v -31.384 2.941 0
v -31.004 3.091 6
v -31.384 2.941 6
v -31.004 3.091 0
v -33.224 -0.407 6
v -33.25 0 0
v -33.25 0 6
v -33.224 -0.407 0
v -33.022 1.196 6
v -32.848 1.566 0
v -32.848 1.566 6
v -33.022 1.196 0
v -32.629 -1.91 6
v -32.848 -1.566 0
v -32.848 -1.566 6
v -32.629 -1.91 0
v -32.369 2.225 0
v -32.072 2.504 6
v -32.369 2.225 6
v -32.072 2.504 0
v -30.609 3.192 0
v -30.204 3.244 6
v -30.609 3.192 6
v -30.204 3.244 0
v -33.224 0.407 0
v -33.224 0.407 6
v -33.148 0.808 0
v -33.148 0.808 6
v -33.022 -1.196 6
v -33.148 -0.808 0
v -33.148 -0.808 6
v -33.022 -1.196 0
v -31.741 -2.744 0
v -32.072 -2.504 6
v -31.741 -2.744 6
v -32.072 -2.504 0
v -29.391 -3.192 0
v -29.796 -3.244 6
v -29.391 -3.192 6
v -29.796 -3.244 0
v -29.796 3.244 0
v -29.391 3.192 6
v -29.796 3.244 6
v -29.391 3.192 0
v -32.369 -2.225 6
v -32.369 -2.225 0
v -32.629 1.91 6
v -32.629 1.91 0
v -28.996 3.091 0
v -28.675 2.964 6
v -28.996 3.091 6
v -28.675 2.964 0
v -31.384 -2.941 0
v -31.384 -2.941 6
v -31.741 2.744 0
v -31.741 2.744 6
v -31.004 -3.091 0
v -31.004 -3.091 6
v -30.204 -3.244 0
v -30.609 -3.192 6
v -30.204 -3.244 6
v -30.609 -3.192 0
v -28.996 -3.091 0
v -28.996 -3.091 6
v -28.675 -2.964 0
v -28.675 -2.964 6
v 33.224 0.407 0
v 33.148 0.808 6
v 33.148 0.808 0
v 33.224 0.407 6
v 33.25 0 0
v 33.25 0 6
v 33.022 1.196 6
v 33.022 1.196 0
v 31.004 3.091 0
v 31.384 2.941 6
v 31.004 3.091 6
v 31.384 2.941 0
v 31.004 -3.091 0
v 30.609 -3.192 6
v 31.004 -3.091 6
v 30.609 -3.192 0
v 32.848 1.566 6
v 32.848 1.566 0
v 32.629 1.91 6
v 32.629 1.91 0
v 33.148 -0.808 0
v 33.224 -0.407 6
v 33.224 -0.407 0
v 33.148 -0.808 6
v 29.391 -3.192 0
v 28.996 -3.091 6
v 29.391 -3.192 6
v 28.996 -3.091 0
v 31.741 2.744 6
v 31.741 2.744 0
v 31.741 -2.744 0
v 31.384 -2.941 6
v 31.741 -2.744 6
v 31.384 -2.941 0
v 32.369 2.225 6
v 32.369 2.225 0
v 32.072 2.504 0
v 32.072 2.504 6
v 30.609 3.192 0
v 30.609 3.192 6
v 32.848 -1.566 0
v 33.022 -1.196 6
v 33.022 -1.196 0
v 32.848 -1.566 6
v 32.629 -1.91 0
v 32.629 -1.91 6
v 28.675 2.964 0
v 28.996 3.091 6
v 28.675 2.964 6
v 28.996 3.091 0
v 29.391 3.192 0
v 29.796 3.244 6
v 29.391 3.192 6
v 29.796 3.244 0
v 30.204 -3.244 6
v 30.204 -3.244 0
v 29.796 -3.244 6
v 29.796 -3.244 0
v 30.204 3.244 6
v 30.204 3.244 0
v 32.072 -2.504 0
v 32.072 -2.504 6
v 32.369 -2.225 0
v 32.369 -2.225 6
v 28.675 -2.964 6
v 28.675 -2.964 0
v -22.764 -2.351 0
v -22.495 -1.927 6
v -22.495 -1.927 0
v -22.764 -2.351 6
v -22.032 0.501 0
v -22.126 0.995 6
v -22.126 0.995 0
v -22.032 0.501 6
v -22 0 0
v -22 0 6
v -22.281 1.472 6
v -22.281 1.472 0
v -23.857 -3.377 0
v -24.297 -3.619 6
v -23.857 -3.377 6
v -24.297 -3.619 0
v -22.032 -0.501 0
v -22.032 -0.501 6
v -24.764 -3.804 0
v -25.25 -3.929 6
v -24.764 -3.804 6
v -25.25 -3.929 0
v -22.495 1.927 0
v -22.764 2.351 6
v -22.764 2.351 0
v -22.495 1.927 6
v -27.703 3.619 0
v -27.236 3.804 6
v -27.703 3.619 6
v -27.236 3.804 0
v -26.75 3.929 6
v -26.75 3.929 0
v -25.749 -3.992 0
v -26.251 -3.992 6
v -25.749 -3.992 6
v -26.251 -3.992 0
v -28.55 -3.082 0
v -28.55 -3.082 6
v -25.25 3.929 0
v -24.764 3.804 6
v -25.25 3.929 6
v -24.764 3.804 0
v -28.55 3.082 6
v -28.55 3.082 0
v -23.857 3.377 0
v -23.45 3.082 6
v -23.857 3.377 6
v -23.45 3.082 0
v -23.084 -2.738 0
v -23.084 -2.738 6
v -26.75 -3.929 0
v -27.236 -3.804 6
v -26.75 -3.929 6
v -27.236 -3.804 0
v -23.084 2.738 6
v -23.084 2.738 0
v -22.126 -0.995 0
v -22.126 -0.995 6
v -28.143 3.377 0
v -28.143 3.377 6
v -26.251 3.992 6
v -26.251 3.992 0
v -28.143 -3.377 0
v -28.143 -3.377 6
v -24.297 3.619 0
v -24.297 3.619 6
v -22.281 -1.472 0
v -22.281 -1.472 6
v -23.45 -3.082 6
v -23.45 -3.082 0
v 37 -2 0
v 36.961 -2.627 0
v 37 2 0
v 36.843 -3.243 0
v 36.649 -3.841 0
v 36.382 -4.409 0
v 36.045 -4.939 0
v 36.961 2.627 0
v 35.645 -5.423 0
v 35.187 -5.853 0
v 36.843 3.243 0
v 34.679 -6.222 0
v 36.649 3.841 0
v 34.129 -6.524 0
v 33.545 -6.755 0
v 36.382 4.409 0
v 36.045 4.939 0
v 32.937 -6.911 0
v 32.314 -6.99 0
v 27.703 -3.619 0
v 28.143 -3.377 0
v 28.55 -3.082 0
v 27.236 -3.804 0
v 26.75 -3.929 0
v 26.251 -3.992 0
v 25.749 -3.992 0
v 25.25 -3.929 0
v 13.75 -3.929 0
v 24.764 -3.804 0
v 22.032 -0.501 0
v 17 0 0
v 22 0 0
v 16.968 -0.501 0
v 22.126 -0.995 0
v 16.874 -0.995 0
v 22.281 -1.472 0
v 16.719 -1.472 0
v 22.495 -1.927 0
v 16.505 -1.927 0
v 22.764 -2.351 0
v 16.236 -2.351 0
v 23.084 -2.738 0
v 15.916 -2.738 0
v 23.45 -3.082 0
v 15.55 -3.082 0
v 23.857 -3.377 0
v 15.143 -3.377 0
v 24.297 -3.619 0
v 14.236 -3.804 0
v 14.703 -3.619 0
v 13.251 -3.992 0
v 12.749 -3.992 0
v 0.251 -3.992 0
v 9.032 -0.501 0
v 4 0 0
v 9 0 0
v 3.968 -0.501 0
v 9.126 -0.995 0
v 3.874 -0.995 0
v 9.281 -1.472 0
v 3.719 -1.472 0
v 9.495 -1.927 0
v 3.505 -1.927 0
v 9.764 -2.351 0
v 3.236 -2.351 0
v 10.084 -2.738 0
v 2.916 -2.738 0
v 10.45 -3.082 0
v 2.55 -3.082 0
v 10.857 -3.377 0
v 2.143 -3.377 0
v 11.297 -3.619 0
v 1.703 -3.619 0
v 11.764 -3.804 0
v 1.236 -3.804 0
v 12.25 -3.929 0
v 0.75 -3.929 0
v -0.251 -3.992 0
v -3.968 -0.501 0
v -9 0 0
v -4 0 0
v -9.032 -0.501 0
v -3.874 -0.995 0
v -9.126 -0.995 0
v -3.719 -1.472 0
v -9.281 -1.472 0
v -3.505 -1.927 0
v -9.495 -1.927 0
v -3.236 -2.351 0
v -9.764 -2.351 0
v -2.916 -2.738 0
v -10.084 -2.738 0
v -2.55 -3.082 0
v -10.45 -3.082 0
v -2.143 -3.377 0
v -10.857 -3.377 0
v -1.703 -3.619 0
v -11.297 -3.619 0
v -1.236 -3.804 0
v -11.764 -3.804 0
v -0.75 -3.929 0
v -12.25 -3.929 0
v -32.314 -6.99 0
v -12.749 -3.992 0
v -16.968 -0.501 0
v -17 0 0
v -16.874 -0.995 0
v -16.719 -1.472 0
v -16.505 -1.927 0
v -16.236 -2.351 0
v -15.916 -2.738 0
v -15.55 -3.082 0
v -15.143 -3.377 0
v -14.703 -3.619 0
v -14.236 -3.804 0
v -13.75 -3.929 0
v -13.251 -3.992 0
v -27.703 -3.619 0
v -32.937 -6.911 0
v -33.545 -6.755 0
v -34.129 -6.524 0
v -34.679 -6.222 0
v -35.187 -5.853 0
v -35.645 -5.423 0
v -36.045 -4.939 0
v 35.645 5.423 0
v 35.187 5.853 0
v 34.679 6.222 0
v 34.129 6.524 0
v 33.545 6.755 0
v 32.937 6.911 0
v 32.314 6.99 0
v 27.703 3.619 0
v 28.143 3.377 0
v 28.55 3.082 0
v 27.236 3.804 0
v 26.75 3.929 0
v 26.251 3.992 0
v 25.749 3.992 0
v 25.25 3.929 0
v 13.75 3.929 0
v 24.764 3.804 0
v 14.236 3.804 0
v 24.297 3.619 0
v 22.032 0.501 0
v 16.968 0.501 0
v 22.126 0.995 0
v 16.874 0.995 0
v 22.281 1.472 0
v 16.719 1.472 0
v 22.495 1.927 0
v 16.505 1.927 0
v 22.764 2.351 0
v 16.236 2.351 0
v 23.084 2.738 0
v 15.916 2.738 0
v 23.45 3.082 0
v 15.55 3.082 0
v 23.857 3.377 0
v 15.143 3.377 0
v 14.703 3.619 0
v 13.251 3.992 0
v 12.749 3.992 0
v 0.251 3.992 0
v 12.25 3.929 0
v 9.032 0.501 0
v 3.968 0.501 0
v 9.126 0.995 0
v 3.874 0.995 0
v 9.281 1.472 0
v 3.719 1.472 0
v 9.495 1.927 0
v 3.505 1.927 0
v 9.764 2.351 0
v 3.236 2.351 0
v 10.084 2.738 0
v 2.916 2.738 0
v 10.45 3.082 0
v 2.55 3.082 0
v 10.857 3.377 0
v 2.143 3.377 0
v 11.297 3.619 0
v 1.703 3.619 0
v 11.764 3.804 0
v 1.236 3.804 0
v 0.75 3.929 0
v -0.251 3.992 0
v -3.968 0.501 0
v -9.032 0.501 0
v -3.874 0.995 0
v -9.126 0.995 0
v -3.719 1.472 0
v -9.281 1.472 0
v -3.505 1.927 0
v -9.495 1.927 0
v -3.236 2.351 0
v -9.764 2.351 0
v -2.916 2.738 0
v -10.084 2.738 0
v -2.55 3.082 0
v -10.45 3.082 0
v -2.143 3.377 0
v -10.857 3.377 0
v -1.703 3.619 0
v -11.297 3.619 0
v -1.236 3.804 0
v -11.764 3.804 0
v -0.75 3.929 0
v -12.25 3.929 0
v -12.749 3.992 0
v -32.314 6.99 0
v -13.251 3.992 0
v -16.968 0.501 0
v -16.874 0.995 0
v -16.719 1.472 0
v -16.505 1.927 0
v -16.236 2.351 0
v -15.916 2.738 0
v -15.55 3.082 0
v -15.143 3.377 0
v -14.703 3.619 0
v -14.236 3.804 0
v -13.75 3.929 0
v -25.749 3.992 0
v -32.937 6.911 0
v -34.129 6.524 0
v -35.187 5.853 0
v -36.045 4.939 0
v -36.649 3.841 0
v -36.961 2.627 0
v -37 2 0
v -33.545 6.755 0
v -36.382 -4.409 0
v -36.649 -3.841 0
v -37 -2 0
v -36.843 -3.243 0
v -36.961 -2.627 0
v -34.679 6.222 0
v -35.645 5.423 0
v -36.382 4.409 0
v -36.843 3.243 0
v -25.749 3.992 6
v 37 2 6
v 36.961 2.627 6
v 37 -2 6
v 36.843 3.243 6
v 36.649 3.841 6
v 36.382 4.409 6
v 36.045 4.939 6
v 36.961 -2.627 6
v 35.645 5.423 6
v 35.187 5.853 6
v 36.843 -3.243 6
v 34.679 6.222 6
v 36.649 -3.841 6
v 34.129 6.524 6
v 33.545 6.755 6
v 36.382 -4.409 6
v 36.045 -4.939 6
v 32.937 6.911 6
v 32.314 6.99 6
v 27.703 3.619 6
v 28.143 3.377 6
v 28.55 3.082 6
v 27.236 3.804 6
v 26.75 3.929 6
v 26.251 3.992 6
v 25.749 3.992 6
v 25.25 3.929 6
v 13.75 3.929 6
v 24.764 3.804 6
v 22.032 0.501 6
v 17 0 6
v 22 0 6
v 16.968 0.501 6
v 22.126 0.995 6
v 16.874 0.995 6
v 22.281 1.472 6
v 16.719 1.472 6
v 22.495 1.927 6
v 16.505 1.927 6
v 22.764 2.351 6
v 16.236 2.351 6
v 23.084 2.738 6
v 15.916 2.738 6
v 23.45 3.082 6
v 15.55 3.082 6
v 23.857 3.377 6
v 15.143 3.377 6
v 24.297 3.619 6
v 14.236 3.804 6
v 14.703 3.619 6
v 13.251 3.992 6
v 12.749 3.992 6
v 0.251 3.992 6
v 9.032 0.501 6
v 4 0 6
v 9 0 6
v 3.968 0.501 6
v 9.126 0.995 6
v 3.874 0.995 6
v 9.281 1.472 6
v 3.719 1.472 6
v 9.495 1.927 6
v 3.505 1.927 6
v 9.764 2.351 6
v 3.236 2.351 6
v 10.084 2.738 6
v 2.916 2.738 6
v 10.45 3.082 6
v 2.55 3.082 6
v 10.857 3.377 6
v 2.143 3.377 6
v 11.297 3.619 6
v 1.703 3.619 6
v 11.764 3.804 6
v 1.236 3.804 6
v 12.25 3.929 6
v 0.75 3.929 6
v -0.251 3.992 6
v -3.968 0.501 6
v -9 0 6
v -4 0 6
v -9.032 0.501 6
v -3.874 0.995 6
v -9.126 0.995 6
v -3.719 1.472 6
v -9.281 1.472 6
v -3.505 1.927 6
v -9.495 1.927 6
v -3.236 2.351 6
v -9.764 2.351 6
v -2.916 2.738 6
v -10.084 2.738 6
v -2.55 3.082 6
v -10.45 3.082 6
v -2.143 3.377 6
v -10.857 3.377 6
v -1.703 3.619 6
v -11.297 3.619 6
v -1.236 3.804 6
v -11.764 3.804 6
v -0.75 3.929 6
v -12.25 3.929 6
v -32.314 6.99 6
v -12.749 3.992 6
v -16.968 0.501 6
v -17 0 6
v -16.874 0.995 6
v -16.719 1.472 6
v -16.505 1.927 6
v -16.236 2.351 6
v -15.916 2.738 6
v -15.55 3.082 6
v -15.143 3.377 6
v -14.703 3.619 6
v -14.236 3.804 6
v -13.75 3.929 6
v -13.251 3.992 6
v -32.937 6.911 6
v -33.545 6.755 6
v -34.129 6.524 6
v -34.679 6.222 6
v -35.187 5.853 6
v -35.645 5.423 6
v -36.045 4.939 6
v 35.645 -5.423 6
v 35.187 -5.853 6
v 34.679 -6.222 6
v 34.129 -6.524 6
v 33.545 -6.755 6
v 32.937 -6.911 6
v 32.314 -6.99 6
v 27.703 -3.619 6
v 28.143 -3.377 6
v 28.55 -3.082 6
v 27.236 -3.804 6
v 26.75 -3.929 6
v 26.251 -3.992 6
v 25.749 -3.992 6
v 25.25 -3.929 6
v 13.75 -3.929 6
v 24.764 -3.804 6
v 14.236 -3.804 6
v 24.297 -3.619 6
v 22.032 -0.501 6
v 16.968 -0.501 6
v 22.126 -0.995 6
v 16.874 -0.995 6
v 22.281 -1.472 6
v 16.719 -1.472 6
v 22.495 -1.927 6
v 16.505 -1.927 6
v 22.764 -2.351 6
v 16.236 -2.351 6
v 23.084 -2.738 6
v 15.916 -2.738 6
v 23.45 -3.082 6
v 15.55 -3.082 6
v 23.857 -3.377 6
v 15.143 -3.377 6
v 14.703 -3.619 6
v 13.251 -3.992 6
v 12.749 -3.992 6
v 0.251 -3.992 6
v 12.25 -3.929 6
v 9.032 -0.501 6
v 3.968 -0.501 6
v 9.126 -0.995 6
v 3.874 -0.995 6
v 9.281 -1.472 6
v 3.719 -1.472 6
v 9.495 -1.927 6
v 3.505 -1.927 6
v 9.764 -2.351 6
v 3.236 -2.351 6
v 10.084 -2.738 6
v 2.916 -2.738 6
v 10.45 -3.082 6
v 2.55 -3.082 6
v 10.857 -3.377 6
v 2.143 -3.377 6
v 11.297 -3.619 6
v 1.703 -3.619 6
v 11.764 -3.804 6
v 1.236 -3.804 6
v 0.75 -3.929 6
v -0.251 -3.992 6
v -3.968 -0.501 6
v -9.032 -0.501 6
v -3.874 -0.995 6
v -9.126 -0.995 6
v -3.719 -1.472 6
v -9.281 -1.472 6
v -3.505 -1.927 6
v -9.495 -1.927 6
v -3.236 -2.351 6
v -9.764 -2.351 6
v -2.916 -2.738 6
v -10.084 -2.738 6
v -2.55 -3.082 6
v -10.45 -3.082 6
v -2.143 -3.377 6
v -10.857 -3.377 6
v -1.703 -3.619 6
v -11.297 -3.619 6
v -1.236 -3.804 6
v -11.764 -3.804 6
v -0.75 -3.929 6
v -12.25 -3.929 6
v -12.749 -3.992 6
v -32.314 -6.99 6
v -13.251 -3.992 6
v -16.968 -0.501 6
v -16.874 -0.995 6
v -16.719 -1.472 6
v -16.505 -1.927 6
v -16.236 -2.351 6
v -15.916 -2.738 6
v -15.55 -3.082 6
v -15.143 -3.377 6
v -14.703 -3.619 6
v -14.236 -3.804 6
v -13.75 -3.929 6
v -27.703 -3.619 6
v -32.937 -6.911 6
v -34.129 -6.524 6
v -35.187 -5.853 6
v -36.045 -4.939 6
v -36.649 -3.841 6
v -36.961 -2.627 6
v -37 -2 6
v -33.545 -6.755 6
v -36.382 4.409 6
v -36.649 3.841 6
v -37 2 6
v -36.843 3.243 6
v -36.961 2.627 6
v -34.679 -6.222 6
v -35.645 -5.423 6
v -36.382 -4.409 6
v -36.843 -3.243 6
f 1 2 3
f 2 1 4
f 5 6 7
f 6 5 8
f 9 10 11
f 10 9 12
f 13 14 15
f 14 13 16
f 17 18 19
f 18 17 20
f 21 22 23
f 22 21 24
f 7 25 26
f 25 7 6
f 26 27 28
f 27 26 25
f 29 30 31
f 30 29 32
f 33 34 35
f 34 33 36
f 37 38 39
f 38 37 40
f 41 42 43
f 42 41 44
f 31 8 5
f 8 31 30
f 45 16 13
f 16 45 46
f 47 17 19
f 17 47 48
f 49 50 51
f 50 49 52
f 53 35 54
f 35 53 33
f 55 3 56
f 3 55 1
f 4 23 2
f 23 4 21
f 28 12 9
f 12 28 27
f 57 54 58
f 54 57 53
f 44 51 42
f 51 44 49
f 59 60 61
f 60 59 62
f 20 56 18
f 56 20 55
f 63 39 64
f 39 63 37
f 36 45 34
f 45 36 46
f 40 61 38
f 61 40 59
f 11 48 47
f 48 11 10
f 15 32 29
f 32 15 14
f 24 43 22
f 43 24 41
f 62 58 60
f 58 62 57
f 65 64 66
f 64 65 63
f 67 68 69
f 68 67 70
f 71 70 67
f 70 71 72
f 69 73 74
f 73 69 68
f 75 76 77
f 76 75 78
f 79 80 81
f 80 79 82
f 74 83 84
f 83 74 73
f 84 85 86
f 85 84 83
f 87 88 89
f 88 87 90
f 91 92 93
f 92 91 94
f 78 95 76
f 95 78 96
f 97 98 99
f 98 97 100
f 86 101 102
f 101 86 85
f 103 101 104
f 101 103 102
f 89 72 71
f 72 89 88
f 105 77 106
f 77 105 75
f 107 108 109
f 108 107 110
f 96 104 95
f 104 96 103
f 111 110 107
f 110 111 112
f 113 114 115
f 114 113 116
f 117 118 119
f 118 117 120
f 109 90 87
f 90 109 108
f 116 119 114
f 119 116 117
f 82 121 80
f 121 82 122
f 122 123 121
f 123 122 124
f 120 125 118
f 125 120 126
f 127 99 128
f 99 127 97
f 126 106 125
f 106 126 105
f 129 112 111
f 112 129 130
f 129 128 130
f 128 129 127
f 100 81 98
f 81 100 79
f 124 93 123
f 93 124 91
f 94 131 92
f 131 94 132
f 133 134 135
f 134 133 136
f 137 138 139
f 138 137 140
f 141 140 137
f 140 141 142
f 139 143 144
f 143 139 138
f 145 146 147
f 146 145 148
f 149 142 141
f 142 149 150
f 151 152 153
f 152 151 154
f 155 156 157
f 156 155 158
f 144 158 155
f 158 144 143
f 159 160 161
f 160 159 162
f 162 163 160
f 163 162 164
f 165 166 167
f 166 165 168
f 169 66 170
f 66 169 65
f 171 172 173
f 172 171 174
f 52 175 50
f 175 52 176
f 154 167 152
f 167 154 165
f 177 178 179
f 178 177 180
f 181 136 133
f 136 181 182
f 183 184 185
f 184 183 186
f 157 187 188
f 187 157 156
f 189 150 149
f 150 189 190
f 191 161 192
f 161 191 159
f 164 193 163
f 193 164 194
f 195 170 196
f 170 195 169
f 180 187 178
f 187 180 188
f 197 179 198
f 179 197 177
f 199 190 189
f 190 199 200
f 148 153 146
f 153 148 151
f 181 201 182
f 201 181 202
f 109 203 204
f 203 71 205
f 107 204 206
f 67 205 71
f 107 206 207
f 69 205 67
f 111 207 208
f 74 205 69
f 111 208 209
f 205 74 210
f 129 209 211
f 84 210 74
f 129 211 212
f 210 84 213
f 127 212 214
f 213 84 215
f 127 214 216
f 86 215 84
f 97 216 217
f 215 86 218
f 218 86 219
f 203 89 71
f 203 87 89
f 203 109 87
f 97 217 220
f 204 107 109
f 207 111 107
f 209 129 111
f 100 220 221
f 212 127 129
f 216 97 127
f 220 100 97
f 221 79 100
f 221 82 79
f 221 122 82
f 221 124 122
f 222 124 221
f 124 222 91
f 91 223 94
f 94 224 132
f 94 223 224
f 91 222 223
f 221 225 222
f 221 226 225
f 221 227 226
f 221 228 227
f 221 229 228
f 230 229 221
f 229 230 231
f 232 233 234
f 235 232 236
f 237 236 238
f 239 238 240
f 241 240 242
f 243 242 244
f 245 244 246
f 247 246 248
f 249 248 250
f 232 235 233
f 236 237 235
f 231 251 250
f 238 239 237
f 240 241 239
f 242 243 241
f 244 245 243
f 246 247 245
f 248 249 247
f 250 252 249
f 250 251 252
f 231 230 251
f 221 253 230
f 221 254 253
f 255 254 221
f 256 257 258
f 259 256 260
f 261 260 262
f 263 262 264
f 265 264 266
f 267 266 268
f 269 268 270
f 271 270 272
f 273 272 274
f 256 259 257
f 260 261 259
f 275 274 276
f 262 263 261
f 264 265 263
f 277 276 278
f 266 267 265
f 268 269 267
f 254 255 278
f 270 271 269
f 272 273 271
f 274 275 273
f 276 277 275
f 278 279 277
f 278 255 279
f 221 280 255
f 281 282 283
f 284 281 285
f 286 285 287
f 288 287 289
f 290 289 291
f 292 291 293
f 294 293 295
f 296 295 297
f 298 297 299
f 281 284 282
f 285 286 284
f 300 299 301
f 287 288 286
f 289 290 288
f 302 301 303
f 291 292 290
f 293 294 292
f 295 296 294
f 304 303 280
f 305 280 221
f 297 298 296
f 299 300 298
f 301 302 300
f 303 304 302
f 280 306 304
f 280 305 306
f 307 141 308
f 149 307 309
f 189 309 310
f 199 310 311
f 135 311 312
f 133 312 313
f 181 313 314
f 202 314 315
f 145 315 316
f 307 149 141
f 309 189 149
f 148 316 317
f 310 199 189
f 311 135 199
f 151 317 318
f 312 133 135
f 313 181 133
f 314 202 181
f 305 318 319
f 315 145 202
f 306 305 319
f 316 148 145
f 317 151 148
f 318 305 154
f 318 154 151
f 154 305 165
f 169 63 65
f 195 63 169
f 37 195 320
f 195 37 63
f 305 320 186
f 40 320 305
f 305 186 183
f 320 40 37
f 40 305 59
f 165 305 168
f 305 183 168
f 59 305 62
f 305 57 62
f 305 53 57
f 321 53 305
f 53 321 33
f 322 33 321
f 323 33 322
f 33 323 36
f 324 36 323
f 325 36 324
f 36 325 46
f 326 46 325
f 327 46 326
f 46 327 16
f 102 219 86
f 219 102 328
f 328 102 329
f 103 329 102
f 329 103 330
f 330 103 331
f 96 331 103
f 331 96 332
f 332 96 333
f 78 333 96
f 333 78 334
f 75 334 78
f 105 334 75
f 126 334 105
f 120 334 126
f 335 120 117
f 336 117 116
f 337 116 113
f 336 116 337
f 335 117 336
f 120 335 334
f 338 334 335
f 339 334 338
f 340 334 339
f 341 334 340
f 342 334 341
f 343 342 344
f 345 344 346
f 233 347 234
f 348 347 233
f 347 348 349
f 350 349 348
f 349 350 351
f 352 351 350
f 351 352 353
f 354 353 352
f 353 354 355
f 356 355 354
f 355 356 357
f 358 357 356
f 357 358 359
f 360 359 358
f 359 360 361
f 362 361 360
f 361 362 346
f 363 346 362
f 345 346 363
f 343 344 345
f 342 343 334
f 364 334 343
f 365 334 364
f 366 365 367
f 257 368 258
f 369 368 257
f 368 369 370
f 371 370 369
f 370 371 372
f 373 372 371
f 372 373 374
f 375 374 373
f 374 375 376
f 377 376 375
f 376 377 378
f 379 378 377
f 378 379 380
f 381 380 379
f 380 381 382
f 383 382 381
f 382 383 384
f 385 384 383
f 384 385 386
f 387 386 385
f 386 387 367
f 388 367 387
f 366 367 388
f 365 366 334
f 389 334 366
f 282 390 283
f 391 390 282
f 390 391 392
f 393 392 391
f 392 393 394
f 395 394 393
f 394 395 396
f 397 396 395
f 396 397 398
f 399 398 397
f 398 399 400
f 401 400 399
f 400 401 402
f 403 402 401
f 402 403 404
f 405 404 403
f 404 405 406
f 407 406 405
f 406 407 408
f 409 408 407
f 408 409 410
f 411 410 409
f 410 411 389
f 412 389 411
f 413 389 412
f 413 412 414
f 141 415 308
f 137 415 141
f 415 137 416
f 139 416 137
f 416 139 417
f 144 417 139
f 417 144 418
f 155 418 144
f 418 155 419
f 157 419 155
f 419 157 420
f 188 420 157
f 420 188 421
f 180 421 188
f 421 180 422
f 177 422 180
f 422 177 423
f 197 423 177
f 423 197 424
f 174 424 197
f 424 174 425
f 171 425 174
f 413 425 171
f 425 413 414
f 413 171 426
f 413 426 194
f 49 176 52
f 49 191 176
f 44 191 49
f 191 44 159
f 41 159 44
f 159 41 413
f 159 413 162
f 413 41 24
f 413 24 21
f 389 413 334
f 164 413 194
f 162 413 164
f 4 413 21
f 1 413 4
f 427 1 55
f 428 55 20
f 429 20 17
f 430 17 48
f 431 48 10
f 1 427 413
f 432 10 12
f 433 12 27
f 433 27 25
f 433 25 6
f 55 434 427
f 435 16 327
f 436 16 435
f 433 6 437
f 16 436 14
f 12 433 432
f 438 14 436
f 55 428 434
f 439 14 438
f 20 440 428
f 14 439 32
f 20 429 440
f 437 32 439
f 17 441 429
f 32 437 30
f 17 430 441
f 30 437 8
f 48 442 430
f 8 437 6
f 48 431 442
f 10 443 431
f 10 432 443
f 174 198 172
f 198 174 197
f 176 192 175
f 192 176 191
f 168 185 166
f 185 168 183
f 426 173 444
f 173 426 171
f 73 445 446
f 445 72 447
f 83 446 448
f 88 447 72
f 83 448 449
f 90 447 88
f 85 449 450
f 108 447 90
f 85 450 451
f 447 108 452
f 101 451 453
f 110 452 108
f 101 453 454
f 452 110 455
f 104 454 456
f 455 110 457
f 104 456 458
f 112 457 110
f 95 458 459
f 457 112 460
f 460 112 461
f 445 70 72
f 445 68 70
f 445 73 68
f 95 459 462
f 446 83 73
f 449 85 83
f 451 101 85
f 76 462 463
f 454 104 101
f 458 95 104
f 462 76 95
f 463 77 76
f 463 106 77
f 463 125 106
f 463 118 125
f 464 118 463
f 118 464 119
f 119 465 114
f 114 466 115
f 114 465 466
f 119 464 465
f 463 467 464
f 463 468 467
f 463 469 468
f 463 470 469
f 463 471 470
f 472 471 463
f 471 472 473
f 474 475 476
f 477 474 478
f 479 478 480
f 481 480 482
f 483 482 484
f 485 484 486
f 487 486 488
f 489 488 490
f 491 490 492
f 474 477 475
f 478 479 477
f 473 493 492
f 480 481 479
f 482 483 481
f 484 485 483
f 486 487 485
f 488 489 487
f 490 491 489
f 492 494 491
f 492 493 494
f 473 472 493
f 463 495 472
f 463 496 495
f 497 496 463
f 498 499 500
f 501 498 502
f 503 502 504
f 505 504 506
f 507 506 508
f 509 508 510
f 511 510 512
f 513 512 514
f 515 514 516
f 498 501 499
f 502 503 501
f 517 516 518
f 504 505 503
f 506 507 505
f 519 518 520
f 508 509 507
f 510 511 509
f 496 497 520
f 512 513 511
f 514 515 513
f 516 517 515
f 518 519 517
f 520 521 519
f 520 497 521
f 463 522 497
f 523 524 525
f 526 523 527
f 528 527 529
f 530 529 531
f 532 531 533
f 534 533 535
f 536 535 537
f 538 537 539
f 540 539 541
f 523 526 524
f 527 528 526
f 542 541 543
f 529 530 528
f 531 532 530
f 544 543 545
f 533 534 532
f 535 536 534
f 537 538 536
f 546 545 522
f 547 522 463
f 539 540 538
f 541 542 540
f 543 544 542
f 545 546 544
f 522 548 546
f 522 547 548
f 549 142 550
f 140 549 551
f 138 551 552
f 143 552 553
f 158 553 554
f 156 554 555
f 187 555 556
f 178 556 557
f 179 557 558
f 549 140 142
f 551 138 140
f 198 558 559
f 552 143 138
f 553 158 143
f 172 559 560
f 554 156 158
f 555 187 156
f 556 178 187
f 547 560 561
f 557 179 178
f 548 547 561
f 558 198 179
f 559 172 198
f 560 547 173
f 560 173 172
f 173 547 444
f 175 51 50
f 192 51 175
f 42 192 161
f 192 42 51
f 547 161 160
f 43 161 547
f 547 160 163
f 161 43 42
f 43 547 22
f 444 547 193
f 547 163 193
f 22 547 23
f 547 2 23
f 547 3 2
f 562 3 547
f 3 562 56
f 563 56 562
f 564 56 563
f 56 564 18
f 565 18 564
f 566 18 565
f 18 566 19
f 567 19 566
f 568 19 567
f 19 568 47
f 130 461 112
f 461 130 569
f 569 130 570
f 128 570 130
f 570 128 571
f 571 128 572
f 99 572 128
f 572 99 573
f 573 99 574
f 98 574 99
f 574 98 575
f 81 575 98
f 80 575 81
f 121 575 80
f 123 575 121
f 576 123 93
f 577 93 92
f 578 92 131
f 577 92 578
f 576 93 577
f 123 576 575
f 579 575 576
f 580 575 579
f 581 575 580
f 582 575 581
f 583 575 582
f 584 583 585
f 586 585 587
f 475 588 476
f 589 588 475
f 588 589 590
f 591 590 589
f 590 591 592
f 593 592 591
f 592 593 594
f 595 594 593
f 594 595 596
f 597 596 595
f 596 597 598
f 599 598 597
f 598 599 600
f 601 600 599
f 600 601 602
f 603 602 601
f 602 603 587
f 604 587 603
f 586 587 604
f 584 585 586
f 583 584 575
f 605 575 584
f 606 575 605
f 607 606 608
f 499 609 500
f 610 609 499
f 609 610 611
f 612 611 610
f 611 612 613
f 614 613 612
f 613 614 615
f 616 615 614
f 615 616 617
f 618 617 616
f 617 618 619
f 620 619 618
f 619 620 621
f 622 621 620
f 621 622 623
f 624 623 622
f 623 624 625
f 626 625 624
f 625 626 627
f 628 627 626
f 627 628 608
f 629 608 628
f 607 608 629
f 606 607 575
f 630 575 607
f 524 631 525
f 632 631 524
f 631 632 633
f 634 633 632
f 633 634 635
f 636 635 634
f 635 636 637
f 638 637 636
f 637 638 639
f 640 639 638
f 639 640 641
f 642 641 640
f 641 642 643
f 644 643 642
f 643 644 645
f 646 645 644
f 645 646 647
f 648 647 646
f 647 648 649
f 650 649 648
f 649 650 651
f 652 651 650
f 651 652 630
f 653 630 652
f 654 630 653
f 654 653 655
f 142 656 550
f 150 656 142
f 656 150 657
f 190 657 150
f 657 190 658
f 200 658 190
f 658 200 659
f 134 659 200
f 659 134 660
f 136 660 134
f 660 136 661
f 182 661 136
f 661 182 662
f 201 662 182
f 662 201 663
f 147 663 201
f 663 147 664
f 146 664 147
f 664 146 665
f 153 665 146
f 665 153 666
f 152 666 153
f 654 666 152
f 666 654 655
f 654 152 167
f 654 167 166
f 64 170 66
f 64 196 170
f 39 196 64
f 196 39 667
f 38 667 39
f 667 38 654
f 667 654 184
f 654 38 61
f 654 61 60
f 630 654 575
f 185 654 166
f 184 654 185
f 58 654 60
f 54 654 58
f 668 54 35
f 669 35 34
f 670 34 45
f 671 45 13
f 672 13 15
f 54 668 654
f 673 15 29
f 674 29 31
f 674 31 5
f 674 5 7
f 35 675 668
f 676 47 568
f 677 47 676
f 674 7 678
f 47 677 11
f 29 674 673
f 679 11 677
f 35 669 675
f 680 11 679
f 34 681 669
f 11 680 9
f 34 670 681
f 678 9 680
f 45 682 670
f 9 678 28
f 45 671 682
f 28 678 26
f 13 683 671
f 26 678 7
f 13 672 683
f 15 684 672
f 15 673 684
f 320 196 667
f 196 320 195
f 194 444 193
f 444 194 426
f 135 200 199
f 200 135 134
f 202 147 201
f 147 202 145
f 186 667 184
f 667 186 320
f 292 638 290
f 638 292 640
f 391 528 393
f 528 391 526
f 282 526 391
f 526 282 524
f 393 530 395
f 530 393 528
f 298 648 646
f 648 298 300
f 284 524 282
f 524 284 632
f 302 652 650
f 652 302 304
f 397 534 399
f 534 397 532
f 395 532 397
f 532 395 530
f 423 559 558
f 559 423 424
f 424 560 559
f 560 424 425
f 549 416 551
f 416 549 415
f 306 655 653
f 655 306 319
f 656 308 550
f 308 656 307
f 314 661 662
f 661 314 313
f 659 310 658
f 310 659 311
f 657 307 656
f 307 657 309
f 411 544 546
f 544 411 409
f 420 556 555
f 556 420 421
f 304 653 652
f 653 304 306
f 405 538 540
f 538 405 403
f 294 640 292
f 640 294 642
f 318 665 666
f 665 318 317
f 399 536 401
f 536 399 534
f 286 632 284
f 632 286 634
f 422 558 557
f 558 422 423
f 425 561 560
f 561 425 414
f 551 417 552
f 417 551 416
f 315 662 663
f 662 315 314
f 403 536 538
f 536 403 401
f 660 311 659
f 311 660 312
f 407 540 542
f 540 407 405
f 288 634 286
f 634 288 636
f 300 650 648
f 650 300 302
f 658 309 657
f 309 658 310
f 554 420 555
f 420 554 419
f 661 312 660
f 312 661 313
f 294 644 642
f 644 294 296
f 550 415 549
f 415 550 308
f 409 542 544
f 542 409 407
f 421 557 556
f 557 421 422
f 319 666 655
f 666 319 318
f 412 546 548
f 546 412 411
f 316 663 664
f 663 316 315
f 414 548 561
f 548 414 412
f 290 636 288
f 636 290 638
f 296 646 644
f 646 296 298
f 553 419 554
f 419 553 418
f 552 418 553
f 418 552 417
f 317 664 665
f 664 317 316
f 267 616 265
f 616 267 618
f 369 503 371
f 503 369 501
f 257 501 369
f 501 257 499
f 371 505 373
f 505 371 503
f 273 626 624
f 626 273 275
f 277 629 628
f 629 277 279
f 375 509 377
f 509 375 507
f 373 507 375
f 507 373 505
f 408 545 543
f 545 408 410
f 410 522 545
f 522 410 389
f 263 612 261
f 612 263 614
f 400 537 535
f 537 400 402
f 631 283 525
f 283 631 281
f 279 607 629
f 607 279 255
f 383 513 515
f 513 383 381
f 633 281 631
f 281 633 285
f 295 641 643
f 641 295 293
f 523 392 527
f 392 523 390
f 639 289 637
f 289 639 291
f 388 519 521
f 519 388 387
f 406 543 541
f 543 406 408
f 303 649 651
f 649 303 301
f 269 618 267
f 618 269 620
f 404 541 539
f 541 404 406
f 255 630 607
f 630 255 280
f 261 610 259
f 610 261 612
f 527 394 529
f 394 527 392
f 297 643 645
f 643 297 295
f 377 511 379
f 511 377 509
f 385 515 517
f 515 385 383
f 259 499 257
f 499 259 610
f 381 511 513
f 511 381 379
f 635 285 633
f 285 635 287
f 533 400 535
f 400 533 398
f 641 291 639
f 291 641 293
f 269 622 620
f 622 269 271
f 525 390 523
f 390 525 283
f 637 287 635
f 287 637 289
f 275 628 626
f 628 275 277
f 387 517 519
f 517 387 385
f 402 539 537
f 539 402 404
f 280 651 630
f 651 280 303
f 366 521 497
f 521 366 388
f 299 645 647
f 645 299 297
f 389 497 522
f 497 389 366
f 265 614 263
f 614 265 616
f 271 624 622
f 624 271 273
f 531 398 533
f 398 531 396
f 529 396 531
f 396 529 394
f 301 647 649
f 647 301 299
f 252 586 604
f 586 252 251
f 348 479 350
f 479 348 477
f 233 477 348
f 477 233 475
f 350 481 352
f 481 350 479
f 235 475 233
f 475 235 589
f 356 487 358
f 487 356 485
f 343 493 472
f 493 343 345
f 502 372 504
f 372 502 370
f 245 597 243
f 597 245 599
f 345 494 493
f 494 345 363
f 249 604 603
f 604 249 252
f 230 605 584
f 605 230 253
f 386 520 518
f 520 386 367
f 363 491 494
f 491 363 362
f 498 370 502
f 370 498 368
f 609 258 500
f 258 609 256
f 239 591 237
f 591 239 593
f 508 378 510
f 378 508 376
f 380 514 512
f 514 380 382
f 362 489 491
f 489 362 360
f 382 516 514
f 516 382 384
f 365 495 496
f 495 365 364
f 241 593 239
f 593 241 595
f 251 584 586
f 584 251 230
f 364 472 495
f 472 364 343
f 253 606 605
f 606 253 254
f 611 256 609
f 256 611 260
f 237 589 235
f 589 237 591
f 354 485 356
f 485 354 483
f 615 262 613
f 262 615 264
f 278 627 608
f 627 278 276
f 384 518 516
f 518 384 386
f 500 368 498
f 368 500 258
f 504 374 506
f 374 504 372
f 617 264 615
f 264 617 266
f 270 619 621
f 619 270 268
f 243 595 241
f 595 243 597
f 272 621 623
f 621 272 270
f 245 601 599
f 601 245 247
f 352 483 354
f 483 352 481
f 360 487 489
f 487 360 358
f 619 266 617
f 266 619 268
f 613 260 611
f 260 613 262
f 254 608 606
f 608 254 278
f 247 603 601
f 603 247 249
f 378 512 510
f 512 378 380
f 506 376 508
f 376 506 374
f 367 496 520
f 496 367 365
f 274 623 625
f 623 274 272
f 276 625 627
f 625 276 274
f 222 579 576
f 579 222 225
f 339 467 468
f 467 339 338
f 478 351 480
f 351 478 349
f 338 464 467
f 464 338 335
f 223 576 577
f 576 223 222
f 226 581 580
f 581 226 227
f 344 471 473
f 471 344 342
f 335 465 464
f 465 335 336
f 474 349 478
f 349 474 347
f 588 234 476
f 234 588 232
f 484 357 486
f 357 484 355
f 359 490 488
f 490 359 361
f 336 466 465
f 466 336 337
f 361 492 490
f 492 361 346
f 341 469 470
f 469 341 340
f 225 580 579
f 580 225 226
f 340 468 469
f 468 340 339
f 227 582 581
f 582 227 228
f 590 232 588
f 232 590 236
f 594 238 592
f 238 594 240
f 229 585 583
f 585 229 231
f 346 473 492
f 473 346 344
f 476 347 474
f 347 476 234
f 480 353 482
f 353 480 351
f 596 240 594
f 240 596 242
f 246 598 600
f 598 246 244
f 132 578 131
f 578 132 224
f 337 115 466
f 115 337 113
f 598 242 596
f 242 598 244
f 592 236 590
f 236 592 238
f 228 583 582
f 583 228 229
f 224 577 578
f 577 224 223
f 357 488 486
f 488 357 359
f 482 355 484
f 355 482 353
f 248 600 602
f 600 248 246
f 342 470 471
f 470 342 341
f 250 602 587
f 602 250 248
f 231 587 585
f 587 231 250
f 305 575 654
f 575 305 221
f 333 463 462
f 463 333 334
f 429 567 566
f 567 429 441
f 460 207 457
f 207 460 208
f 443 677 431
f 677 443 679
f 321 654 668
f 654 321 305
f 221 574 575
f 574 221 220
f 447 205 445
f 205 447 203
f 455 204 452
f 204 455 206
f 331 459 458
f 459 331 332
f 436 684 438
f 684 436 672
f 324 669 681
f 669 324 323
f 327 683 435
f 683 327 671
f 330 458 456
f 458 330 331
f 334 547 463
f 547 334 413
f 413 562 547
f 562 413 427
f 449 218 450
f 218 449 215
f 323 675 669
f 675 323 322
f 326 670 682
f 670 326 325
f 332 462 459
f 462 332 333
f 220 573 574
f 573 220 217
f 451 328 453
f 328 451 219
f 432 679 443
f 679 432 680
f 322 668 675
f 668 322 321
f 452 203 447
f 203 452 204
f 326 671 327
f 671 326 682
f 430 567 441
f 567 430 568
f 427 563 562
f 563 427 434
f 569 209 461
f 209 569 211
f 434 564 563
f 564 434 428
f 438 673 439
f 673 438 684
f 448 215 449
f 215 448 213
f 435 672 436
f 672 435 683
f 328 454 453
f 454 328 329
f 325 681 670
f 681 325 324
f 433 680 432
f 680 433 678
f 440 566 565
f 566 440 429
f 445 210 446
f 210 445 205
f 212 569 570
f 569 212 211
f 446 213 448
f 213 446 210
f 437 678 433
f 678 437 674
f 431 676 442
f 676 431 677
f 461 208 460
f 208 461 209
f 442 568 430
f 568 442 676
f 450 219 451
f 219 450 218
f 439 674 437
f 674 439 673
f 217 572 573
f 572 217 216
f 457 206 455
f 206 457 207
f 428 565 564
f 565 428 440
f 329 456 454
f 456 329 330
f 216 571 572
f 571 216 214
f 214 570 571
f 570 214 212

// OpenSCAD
$fn = 50;


difference() {
	union() {
		hull() {
			translate(v = [-32.0000000000, 2.0000000000, 0]) {
				cylinder(h = 6, r = 5);
			}
			translate(v = [32.0000000000, 2.0000000000, 0]) {
				cylinder(h = 6, r = 5);
			}
			translate(v = [-32.0000000000, -2.0000000000, 0]) {
				cylinder(h = 6, r = 5);
			}
			translate(v = [32.0000000000, -2.0000000000, 0]) {
				cylinder(h = 6, r = 5);
			}
		}
	}
	union() {
		#translate(v = [-30.0000000000, 0.0000000000, -100.0000000000]) {
			cylinder(h = 200, r = 3.2500000000);
		}
		#translate(v = [-30.0000000000, 0.0000000000, -100.0000000000]) {
			cylinder(h = 200, r = 3.2500000000);
		}
		#translate(v = [30.0000000000, 0.0000000000, -100.0000000000]) {
			cylinder(h = 200, r = 3.2500000000);
		}
		#translate(v = [30.0000000000, 0.0000000000, -100.0000000000]) {
			cylinder(h = 200, r = 3.2500000000);
		}
		#translate(v = [-26.0000000000, 0, 0]) {
			cylinder(h = 6, r = 4.0000000000);
		}
		#translate(v = [-13.0000000000, 0, 0]) {
			cylinder(h = 6, r = 4.0000000000);
		}
		#cylinder(h = 6, r = 4.0000000000);
		#translate(v = [13.0000000000, 0, 0]) {
			cylinder(h = 6, r = 4.0000000000);
		}
		#translate(v = [26.0000000000, 0, 0]) {
			cylinder(h = 6, r = 4.0000000000);
		}
	}
}
